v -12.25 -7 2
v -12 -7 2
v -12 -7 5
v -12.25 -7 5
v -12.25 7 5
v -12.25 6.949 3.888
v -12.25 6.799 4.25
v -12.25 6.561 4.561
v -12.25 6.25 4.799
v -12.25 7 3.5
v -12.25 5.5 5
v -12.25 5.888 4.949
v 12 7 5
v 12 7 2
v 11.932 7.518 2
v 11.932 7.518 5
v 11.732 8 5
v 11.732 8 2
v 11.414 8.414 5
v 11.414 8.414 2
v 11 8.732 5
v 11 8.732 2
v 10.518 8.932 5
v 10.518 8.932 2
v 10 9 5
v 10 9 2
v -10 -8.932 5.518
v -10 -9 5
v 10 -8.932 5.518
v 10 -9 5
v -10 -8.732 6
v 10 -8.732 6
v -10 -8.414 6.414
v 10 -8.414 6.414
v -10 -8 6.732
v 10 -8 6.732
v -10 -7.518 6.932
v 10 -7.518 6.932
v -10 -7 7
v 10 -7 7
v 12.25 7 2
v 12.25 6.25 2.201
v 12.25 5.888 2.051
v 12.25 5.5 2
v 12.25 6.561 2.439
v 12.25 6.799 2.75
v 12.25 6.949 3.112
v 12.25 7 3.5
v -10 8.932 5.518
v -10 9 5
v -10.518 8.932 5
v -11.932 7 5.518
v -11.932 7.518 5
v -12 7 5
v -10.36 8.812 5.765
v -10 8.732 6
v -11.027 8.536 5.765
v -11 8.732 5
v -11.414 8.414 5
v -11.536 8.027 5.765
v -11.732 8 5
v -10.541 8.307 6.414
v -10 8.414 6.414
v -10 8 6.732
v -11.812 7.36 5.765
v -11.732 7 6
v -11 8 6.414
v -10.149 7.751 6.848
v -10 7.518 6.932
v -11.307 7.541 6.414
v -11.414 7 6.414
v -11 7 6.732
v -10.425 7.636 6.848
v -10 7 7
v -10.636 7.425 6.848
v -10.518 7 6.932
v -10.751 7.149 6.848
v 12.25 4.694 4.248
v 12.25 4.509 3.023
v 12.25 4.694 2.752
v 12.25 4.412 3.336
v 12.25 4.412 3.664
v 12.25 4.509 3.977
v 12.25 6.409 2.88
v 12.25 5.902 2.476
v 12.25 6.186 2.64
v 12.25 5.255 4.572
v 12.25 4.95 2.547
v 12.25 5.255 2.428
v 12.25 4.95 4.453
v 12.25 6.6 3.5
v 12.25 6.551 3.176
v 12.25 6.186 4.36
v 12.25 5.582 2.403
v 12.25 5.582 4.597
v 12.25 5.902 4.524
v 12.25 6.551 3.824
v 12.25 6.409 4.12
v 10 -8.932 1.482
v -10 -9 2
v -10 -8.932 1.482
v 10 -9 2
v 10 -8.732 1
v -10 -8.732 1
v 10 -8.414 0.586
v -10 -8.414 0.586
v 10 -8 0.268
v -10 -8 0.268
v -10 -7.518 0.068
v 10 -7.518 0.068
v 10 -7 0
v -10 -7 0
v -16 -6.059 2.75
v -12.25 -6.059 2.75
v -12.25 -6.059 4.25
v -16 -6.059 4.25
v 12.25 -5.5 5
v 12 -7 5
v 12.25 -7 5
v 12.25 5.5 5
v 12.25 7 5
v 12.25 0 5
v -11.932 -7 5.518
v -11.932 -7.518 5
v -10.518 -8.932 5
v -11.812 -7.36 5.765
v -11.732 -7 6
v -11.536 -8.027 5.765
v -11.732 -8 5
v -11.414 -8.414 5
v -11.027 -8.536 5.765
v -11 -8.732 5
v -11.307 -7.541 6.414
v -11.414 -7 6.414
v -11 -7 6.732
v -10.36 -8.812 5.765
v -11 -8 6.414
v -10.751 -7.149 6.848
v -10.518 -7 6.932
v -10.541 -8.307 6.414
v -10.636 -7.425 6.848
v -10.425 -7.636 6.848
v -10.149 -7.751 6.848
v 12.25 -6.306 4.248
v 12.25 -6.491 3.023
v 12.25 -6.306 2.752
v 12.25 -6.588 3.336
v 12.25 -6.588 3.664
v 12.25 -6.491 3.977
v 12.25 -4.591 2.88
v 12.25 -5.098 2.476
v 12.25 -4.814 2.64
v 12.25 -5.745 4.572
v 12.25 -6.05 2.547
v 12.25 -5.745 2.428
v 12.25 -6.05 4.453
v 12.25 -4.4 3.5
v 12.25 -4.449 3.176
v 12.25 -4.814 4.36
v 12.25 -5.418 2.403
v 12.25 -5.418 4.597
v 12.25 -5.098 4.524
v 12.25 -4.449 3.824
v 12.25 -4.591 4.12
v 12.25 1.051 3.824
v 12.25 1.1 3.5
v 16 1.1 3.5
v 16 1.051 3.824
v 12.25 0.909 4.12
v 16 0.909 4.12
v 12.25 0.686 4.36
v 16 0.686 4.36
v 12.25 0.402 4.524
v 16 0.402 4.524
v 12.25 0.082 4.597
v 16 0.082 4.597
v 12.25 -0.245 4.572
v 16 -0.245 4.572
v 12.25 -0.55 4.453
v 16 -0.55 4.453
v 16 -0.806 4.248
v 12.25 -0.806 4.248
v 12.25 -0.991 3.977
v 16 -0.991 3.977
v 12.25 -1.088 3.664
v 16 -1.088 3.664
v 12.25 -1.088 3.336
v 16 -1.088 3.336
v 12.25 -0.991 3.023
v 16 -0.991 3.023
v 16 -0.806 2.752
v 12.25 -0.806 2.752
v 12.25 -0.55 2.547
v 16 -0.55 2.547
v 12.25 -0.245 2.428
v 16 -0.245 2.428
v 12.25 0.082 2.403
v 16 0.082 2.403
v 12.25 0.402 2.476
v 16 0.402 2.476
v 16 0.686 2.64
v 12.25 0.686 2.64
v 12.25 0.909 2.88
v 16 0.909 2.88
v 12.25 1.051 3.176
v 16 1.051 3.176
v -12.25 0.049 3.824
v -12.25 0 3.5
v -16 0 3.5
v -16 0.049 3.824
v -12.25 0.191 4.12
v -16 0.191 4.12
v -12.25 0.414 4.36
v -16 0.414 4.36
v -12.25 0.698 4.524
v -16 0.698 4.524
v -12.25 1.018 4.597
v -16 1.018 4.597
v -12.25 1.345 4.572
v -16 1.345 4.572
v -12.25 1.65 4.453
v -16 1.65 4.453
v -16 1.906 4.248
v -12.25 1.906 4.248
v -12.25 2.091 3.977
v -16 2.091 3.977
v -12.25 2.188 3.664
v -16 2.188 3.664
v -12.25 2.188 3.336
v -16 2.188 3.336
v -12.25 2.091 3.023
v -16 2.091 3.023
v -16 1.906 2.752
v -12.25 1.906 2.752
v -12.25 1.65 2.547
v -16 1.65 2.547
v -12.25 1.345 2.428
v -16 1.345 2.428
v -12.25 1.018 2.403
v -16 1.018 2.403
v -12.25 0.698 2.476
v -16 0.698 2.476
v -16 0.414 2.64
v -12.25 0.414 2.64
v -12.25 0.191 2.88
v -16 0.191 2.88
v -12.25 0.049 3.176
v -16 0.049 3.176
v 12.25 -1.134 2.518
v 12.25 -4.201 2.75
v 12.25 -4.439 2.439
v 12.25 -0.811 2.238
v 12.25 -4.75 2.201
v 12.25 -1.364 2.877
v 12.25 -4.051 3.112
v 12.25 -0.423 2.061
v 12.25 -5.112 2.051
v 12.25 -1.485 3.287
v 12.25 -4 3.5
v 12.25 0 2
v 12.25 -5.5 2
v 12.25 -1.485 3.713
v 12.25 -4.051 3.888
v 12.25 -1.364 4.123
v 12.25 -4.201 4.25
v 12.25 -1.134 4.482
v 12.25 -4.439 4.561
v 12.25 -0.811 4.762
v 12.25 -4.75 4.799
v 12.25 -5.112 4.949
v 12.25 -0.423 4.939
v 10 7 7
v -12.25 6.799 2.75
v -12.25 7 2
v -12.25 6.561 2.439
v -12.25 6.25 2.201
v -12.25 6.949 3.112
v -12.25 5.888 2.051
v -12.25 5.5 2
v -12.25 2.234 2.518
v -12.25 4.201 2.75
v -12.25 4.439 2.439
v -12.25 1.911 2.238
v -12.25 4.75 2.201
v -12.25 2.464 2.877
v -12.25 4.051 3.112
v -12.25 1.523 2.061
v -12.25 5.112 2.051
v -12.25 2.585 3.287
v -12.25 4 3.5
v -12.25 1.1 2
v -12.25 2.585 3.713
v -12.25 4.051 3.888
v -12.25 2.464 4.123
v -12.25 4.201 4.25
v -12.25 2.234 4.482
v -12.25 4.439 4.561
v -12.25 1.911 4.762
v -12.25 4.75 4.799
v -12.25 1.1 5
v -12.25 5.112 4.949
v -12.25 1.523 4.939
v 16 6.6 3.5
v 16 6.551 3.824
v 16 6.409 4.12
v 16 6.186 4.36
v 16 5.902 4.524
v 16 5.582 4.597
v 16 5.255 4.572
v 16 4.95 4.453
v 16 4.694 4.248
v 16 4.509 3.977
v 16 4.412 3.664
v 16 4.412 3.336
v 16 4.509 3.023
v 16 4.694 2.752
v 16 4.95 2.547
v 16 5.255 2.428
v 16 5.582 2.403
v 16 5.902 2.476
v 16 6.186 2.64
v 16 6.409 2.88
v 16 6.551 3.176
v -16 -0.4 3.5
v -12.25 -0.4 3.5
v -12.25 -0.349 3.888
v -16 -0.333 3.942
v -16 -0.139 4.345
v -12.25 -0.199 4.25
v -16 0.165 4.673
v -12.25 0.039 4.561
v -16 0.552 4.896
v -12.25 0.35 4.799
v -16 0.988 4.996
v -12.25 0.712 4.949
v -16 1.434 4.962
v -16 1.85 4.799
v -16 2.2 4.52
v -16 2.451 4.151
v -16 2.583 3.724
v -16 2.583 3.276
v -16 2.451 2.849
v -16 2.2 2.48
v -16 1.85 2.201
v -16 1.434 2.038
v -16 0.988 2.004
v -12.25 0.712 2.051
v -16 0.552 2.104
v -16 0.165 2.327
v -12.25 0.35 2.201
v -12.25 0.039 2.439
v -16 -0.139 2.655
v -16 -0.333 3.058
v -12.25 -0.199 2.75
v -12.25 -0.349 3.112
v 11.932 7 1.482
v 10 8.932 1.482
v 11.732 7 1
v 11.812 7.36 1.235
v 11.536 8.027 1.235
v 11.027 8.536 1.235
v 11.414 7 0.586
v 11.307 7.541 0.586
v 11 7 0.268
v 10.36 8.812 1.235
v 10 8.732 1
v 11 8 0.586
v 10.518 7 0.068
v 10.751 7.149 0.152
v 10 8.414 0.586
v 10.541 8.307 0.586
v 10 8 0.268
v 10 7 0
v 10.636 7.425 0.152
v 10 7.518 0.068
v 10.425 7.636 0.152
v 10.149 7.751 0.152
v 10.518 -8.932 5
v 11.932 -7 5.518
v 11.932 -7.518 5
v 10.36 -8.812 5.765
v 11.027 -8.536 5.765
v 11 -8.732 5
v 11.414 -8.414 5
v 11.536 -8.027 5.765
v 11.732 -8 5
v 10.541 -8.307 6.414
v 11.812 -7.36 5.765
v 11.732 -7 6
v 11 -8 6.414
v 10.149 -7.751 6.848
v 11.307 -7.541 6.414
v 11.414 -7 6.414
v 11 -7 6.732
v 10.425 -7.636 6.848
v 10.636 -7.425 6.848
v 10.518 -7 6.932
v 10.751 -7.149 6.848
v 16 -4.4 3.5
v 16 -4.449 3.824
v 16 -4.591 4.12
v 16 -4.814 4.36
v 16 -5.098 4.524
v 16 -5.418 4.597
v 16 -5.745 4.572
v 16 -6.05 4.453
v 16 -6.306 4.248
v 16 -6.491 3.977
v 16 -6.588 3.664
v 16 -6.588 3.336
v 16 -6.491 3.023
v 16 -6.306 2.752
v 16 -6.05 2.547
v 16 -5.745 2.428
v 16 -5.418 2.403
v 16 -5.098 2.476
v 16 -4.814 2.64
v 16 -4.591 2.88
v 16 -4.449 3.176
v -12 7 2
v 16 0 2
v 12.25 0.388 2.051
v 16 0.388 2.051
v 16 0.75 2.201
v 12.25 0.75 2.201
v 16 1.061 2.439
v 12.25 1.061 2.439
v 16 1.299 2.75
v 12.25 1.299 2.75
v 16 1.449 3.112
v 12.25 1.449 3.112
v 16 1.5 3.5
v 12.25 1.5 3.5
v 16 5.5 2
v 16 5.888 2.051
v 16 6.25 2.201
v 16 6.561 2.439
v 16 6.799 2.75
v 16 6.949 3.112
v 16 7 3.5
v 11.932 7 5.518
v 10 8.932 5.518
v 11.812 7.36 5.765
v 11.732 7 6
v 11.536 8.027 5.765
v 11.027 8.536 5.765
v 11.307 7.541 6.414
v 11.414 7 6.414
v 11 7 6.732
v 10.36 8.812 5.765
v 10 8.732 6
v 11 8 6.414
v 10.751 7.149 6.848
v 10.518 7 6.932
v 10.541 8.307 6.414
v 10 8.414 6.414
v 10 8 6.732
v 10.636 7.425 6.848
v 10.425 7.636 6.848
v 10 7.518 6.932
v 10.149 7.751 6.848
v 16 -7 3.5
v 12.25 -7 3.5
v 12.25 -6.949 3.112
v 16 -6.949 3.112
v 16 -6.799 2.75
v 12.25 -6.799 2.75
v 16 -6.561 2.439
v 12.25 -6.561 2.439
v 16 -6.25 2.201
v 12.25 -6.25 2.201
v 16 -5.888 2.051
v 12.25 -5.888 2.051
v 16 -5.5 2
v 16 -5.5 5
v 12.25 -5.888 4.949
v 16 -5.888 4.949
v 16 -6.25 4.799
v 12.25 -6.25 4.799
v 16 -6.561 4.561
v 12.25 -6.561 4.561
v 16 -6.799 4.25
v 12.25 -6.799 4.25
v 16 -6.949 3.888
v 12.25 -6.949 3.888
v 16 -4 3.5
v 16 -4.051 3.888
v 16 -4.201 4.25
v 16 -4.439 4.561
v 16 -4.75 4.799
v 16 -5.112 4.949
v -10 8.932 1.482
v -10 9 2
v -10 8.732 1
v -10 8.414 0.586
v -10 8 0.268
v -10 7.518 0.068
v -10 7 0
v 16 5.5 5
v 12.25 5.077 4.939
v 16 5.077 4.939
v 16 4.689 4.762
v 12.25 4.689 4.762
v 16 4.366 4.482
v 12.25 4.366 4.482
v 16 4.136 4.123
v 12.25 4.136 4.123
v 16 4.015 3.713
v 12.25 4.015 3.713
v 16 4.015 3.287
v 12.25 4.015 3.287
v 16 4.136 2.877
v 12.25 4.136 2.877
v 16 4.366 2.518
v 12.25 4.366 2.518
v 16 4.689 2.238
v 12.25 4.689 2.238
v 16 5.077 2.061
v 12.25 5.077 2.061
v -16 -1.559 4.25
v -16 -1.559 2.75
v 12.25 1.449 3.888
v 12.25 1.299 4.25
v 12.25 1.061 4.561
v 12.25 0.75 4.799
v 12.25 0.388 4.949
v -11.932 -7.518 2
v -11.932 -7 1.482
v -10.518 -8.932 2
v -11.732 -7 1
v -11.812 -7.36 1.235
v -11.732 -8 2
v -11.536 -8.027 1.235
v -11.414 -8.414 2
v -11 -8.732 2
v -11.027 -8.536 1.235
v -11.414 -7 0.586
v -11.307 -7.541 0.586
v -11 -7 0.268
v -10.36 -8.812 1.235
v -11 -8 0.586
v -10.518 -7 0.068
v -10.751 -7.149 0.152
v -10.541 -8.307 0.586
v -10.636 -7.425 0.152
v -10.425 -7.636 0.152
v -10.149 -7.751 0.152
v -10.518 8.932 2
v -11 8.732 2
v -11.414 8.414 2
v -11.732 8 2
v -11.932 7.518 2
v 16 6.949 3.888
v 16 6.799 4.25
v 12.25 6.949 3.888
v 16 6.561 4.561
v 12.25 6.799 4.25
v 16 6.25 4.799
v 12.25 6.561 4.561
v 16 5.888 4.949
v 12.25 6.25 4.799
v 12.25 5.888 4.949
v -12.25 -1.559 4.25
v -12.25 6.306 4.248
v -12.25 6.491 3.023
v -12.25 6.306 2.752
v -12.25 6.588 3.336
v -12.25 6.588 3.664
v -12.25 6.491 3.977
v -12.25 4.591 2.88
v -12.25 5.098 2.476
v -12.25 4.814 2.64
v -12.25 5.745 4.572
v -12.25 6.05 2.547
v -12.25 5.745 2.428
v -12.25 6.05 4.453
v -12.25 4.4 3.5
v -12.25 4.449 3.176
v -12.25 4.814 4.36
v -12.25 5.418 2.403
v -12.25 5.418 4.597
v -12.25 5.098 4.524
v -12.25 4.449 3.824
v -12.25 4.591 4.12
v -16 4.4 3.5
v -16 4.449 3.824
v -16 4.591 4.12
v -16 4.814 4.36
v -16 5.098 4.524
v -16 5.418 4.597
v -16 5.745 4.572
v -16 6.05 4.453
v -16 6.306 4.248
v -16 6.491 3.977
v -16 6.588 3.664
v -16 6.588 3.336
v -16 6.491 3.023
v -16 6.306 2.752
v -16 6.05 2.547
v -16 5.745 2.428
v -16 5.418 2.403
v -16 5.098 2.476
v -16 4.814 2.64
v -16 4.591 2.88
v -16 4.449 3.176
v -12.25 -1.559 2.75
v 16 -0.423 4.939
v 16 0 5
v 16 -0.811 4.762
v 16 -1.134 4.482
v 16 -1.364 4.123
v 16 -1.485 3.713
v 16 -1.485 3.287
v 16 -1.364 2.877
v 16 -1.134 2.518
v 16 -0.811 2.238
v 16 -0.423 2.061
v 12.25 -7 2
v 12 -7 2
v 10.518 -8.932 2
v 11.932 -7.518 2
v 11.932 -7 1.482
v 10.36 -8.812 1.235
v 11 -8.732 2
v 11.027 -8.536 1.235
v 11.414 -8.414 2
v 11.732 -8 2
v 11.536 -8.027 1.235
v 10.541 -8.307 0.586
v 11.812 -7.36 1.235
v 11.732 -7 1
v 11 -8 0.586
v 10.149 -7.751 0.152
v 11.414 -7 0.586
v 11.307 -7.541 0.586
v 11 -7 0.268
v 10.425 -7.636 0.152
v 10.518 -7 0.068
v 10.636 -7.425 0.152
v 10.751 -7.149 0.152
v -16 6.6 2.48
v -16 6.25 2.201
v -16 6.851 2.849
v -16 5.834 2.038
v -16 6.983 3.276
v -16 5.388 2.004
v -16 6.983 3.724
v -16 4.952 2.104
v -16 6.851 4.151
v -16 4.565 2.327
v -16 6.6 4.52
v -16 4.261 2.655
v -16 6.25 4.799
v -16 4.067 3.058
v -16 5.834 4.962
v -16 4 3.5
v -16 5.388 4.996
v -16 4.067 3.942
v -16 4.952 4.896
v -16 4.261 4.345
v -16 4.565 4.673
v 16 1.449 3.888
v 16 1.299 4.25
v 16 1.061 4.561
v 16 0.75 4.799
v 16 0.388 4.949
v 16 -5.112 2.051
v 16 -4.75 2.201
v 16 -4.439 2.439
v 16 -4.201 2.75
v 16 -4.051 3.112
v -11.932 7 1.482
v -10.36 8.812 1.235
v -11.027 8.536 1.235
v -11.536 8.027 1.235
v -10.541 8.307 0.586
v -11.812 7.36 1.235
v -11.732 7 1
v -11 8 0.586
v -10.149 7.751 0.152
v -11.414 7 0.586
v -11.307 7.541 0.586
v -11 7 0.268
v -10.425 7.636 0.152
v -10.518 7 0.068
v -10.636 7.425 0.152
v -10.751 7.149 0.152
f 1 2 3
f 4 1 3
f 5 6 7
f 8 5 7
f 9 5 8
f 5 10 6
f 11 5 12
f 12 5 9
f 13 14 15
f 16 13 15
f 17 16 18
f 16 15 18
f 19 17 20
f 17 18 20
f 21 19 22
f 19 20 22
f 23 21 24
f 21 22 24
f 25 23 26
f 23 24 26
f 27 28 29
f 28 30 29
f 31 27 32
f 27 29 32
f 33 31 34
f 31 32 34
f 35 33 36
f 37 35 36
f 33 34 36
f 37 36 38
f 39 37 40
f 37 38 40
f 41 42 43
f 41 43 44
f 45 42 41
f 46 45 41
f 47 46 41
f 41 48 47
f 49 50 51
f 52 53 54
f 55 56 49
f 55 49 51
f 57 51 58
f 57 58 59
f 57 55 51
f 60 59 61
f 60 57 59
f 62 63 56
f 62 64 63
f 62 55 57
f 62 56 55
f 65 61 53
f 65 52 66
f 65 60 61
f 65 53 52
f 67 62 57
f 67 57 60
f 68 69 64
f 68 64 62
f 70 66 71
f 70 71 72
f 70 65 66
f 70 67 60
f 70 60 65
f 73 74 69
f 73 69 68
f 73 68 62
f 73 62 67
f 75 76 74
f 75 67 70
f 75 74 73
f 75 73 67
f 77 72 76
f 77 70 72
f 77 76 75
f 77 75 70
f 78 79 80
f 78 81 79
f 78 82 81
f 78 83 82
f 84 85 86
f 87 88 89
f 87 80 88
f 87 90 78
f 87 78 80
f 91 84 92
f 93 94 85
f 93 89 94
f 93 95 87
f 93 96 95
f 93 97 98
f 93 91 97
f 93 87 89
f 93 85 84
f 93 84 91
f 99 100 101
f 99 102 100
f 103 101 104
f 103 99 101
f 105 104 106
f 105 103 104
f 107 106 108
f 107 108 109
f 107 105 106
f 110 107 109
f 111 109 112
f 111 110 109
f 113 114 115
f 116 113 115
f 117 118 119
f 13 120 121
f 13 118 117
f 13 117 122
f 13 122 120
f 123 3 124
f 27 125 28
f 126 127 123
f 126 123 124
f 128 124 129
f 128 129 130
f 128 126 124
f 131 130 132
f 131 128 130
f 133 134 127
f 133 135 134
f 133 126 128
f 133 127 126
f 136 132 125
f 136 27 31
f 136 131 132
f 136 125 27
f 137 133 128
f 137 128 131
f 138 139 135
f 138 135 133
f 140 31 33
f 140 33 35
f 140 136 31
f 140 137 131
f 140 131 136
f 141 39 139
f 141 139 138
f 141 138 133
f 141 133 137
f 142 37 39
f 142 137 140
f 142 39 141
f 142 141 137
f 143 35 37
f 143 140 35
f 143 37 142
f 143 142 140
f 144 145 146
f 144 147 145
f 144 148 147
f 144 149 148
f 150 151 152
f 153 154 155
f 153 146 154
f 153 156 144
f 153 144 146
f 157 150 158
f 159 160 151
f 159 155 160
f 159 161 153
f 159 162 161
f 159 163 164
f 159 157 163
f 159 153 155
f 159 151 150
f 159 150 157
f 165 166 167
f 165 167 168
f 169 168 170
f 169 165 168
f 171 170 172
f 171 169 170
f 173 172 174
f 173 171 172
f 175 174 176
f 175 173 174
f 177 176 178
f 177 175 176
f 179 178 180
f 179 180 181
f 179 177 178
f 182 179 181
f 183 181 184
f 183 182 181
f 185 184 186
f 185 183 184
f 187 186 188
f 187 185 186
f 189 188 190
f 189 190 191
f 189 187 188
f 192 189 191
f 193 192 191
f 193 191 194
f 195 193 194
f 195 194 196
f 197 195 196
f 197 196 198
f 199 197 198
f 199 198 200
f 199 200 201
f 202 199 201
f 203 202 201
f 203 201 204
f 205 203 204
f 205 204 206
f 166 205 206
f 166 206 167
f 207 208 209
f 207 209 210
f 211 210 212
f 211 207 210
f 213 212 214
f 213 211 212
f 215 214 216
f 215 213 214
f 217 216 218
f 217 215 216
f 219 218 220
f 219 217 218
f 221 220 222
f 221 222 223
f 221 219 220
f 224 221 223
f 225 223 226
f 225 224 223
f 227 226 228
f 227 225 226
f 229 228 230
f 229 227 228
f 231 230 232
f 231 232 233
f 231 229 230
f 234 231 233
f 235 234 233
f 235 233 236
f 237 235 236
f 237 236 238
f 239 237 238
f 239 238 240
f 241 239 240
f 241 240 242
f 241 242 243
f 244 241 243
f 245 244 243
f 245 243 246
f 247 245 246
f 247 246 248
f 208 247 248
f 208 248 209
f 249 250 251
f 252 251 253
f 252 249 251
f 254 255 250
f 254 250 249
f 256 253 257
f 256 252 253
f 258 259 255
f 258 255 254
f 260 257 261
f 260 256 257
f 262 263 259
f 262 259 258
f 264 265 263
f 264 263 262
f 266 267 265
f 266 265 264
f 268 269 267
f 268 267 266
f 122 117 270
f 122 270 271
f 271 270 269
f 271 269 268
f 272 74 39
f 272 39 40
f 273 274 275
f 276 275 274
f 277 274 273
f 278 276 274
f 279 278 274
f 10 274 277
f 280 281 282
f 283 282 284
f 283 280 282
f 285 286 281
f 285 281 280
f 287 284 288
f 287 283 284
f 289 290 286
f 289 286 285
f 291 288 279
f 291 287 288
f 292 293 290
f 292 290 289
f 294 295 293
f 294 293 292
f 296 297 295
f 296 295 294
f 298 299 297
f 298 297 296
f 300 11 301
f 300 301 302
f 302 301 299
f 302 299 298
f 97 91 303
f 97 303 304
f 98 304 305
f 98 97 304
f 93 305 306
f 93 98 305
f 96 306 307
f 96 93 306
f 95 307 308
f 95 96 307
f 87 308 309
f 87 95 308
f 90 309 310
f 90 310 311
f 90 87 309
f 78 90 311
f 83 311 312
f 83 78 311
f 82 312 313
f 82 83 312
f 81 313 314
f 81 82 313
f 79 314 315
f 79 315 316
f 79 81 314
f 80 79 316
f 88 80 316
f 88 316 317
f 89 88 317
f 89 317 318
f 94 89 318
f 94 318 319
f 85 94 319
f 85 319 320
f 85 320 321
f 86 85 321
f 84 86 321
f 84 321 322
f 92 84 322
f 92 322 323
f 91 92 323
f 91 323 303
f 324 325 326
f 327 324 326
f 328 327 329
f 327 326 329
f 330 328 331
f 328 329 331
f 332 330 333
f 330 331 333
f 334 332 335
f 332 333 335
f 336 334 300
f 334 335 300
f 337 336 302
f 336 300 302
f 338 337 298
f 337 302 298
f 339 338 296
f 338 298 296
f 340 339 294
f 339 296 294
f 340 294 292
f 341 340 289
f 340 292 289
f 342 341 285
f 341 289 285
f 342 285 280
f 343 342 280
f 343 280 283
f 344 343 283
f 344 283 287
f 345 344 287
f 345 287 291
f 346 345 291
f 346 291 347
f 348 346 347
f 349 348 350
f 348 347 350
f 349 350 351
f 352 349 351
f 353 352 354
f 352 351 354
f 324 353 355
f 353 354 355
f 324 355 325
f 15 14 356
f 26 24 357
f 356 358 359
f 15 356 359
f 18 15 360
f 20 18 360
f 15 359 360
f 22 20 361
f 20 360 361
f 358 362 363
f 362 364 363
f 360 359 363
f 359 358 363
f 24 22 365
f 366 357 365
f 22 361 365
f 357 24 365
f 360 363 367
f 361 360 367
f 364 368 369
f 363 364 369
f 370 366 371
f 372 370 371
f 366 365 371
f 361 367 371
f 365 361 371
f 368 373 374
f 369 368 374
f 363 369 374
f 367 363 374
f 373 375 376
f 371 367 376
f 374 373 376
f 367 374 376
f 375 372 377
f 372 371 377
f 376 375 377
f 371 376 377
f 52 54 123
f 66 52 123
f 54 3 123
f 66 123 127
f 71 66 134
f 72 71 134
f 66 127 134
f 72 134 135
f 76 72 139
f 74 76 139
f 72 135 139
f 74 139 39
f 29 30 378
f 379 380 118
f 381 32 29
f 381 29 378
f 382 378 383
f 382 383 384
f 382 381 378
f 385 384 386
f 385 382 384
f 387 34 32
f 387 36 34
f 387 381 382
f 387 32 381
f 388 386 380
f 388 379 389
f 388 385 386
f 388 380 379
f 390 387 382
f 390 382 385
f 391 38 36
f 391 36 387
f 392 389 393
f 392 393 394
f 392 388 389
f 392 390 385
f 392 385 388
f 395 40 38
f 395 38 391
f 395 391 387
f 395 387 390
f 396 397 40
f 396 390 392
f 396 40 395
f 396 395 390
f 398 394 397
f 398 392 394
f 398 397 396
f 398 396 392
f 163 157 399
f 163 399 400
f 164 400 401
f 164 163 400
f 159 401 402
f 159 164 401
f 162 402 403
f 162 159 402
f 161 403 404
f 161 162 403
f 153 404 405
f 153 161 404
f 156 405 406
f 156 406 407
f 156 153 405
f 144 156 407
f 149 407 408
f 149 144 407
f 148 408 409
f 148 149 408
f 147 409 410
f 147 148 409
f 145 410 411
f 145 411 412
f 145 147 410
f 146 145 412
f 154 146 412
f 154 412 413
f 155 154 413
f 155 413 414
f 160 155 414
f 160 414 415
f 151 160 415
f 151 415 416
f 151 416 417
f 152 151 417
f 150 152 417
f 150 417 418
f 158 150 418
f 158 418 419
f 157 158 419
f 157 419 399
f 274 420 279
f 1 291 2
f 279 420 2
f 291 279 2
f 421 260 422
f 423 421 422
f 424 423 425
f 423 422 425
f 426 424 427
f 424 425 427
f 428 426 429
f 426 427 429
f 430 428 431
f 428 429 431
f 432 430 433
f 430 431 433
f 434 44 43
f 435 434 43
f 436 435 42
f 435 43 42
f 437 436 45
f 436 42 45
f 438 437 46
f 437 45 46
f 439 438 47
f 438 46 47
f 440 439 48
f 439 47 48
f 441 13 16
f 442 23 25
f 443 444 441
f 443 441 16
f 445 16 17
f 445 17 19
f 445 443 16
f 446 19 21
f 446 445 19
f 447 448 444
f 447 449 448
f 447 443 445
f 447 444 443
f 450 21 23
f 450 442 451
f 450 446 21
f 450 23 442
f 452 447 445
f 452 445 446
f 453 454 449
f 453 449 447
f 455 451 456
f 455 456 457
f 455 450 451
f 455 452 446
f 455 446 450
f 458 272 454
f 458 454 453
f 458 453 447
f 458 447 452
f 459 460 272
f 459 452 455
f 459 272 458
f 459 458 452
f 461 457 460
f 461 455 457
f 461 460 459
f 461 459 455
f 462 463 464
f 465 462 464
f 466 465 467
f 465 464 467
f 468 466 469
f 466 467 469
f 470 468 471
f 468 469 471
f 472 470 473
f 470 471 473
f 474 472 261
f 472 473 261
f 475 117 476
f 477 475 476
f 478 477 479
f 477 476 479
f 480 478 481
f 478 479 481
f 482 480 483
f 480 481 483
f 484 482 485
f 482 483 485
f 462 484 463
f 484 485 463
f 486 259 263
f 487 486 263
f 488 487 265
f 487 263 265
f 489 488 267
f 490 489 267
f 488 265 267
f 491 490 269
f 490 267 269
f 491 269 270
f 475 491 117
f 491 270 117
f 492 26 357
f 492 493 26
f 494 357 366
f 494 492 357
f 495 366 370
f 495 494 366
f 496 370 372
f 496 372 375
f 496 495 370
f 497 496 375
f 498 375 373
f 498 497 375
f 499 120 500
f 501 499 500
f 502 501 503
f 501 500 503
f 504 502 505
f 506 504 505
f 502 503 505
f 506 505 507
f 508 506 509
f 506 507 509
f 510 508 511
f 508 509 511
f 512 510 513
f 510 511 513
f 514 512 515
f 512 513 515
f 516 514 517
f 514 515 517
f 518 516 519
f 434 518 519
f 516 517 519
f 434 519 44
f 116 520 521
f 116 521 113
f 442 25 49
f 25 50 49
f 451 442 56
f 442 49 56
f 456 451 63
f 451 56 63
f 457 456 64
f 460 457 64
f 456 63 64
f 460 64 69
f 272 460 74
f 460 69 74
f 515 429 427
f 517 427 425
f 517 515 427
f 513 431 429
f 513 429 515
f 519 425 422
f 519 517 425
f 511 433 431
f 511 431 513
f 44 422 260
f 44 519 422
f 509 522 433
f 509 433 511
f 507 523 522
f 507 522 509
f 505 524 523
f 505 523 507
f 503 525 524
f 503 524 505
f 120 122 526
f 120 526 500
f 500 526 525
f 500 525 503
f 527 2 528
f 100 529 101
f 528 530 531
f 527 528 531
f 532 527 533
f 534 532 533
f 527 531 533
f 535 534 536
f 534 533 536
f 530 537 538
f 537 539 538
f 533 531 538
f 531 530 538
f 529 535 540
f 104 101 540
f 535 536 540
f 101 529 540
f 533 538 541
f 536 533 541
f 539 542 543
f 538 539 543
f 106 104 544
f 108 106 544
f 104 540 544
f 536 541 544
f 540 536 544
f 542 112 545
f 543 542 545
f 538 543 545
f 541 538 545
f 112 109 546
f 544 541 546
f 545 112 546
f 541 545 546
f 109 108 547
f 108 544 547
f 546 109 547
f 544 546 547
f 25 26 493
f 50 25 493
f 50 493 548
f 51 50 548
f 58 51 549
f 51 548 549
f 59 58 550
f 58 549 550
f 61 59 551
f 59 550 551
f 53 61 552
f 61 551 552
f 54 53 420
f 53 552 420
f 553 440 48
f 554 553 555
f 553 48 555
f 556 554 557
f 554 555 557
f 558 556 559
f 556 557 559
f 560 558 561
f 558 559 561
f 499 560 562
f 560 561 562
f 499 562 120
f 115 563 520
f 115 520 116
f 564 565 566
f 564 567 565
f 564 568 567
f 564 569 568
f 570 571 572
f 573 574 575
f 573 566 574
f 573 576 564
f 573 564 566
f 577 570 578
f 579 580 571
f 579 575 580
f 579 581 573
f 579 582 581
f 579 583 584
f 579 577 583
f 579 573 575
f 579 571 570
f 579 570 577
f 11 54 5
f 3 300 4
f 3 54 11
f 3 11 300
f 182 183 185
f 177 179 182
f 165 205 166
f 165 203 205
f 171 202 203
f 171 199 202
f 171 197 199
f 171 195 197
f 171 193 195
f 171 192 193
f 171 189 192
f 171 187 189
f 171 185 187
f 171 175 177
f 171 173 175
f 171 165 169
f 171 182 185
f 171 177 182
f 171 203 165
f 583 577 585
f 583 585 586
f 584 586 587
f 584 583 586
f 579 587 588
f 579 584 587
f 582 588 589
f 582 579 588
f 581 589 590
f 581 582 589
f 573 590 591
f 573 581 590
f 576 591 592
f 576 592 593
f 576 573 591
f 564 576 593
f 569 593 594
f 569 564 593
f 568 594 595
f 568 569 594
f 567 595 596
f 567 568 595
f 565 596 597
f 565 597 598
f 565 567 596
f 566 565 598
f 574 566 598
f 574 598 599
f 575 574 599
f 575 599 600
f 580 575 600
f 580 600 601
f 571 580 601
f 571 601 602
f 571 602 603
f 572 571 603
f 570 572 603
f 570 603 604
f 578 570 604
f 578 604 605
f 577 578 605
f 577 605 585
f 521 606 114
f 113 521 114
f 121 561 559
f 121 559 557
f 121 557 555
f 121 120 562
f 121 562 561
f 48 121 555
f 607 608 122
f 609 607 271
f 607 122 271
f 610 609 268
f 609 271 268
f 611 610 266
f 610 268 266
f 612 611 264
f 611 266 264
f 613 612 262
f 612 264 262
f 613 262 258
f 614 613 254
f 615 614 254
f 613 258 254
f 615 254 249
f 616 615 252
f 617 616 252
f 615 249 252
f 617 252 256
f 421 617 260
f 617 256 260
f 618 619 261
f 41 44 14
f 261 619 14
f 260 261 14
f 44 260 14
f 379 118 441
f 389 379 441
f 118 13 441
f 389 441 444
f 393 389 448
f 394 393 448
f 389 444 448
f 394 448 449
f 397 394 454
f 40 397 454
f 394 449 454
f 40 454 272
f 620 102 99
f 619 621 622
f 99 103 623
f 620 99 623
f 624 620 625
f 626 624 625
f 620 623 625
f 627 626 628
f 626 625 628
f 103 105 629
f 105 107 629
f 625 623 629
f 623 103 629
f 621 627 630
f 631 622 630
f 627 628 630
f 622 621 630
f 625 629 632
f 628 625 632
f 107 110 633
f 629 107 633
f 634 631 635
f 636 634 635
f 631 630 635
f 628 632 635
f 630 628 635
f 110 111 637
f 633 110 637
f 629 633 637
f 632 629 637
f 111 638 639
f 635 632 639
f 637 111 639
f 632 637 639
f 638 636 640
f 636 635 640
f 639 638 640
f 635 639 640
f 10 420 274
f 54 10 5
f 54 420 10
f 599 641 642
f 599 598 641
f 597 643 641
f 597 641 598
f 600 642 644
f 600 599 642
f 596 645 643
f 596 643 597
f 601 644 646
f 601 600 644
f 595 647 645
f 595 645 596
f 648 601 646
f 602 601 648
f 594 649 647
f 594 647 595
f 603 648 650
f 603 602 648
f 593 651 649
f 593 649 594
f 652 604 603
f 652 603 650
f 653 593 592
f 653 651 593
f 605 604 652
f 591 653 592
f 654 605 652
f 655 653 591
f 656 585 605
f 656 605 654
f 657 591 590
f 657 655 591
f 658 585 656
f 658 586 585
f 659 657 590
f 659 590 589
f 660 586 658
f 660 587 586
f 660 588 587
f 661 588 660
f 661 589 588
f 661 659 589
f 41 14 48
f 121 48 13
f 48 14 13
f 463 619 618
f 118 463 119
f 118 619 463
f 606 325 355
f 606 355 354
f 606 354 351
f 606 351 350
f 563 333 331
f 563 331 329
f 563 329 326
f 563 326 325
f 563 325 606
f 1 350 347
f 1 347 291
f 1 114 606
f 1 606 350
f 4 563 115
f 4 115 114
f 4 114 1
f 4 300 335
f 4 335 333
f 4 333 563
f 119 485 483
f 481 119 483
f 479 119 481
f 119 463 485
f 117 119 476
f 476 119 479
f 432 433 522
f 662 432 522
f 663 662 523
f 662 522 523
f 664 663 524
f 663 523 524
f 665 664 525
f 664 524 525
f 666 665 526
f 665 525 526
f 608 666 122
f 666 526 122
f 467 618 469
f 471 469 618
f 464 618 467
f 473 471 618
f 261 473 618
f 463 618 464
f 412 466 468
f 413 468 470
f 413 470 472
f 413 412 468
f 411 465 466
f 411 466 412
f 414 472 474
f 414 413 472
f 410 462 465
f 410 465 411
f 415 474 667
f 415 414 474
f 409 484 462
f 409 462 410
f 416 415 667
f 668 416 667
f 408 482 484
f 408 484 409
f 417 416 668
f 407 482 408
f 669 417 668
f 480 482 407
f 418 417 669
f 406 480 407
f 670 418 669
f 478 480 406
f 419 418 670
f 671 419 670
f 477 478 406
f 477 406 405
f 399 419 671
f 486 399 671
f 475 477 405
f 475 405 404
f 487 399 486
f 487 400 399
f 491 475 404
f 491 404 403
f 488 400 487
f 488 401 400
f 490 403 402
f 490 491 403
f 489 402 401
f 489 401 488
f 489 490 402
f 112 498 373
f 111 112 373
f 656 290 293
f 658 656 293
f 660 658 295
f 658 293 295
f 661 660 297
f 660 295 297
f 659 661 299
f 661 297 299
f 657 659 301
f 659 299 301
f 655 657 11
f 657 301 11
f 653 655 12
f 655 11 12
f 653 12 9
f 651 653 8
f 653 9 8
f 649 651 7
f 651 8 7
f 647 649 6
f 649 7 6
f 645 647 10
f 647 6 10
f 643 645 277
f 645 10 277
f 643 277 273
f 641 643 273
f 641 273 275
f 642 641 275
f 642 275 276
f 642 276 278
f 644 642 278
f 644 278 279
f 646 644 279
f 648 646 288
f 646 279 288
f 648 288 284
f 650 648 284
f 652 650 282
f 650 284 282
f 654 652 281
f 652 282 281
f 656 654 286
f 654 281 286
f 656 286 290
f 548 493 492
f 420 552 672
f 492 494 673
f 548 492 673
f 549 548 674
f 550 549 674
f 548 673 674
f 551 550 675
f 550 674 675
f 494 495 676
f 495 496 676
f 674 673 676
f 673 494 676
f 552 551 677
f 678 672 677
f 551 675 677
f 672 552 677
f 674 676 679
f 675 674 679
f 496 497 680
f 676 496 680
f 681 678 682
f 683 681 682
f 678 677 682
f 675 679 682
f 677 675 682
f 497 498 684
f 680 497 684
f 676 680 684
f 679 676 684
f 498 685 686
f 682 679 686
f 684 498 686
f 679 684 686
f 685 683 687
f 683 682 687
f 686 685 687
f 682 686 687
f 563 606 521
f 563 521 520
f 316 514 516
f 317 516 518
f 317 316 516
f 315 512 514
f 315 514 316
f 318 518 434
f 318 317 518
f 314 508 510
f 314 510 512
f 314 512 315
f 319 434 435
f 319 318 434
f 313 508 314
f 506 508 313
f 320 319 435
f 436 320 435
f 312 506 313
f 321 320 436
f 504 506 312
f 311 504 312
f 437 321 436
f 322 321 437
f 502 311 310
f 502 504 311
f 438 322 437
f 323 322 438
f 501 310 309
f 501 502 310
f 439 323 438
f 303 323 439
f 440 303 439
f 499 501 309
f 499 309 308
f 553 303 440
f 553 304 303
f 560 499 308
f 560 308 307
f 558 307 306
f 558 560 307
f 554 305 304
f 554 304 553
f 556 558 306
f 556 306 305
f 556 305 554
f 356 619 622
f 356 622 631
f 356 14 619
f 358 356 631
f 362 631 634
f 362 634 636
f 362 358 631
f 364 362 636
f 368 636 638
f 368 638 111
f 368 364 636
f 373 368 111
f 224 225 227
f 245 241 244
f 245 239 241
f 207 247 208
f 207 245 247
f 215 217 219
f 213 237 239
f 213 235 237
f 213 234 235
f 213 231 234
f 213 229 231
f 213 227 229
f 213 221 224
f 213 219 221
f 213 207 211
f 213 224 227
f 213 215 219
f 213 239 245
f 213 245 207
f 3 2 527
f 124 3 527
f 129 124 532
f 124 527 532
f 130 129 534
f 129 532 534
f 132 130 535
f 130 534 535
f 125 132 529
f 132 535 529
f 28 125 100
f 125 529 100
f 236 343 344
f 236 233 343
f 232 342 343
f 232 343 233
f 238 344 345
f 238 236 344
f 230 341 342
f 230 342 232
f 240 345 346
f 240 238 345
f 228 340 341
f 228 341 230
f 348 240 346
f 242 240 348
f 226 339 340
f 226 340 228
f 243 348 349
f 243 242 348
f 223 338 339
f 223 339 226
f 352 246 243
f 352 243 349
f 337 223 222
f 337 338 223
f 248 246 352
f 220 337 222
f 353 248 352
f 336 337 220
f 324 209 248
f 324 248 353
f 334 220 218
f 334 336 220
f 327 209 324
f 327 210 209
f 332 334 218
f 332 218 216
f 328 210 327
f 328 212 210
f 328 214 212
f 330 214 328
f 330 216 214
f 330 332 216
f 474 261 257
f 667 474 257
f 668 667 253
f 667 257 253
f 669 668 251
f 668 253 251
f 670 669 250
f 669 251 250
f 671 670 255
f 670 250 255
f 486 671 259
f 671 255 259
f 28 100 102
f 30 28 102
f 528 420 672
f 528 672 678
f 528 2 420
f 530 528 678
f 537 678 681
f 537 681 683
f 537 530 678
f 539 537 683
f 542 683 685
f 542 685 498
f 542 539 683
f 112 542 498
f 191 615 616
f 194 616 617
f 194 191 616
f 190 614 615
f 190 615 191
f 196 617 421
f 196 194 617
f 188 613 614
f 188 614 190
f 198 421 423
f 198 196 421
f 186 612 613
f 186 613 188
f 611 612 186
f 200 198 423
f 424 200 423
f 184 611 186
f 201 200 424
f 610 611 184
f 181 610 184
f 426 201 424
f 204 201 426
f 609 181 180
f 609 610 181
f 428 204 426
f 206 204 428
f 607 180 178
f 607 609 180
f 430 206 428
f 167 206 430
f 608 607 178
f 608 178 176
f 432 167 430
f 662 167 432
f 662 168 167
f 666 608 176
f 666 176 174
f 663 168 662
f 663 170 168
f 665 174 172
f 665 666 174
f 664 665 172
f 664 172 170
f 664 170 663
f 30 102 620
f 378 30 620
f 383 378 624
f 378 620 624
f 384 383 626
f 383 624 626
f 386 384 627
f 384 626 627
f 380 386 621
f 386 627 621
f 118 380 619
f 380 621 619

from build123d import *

# Parameters (mm, degrees)
F1_DEPTH  = 7
F2_R      = 2
F3_R      = 1.1
F4_DEPTH  = 4
F5_R      = 1.5
F5_R_2    = 1.1
F6_DEPTH  = 4
F5_W      = 4.5
F5_H      = 1.5
F7_W      = 14
F7_H      = 3
F8_DEPTH  = 0.25
F9_W      = 14
F9_H      = 3
F10_DEPTH = 0.25


with BuildPart() as f1:
    # F0 (on Top) → F1 (new body)
    with BuildSketch(Plane.XY):
        with BuildLine():
            ThreePointArc((12, 7), (11.4142135624, 8.4142135624), (10, 9))
            Line((10, 9), (-10, 9))
            ThreePointArc((-10, 9), (-11.4142135624, 8.4142135624), (-12, 7))
            Line((-12, 7), (-12, -7))
            ThreePointArc((-12, -7), (-11.4142135624, -8.4142135624), (-10, -9))
            Line((-10, -9), (10, -9))
            ThreePointArc((10, -9), (11.4142135624, -8.4142135624), (12, -7))
            Line((12, -7), (12, 7))
        make_face()
    extrude(amount=F1_DEPTH)

    # F2
    f2_edges = [f1.edges().sort_by_distance(p)[0] for p in [
        (11.414214, 8.414214, 7),
        (0, 9, 7),
        (-11.414214, 8.414214, 7),
        (-12, 0, 7),
        (-11.414214, -8.414214, 7),
        (0, -9, 7),
        (11.414214, -8.414214, 7),
        (12, 0, 7),
        (11.414214, 8.414214, 0),
        (0, 9, 0),
        (-11.414214, 8.414214, 0),
        (-12, 0, 0),
        (-11.414214, -8.414214, 0),
        (0, -9, 0),
        (11.414214, -8.414214, 0),
        (12, 0, 0),
    ]]
    fillet(f2_edges, radius=F2_R)



with BuildPart() as f4:
    # F3 (on face) → F4 (new body)
    with BuildSketch(Plane.YZ.offset(12)):
        with BuildLine():
            ThreePointArc((-4, 3.5), (-4.4393398246, 4.5606601681), (-5.4999999897, 5))
            ThreePointArc((-5.4999999897, 5), (-6.5606601681, 4.5606601754), (-7, 3.5))
            ThreePointArc((-7, 3.5), (-6.5606601718, 2.4393398282), (-5.5, 2))
            ThreePointArc((-5.5, 2), (-4.4393398282, 2.4393398282), (-4, 3.5))
        make_face()
        with Locations((-5.5, 3.5)):
            Circle(F3_R, mode=Mode.SUBTRACT)
    extrude(amount=F4_DEPTH)


with BuildPart() as f4b:
    # F3 (on face) → F4, piece 2 (new body)
    with BuildSketch(Plane.YZ.offset(12)):
        with BuildLine():
            ThreePointArc((0, 2), (1.0606601718, 2.4393398282), (1.5, 3.5))
            ThreePointArc((1.5, 3.5), (1.0606601718, 4.5606601718), (0, 5))
            ThreePointArc((0, 5), (-1.5, 3.5), (0, 2))
        make_face()
        with Locations((0, 3.5)):
            Circle(F3_R, mode=Mode.SUBTRACT)
    extrude(amount=F4_DEPTH)


with BuildPart() as f4c:
    # F3 (on face) → F4, piece 3 (new body)
    with BuildSketch(Plane.YZ.offset(12)):
        with BuildLine():
            ThreePointArc((7, 3.5), (6.5606601718, 4.5606601718), (5.5, 5))
            ThreePointArc((5.5, 5), (4, 3.499999998), (5.5000000039, 2))
            ThreePointArc((5.5000000039, 2), (6.5606601732, 2.4393398296), (7, 3.5))
        make_face()
        with Locations((5.5, 3.5)):
            Circle(F3_R, mode=Mode.SUBTRACT)
    extrude(amount=F4_DEPTH)


with BuildPart() as f6:
    # F5 (on face) → F6 (new body)
    with BuildSketch(Plane(origin=(-12, 0, 0), x_dir=(0, -1, 0), z_dir=(-1, 0, 0))):
        with Locations((-5.5, 3.5)):
            Circle(F5_R)
        with Locations((-5.5, 3.5)):
            Circle(F5_R_2, mode=Mode.SUBTRACT)
    extrude(amount=F6_DEPTH)


with BuildPart() as f6b:
    # F5 (on face) → F6, piece 2 (new body)
    with BuildSketch(Plane(origin=(-12, 0, 0), x_dir=(0, -1, 0), z_dir=(-1, 0, 0))):
        with Locations((-1.1, 3.5)):
            Circle(F5_R)
        with Locations((-1.1, 3.5)):
            Circle(F5_R_2, mode=Mode.SUBTRACT)
    extrude(amount=F6_DEPTH)


with BuildPart() as f6c:
    # F5 (on face) → F6, piece 3 (new body)
    with BuildSketch(Plane(origin=(-12, 0, 0), x_dir=(0, -1, 0), z_dir=(-1, 0, 0))):
        with Locations((3.8085386623, 3.5)):
            Rectangle(F5_W, F5_H)
    extrude(amount=F6_DEPTH)


with BuildPart() as f1_1:
    add(f1.part)

    add(f4.part)  # F8 merges F4

    add(f4b.part)  # F8 merges F4b

    add(f4c.part)  # F8 merges F4c
    # F7 (on face) → F8 (join)
    with BuildSketch(Plane.YZ.offset(12)):
        with Locations((0, 3.5)):
            Rectangle(F7_W, F7_H)
    extrude(amount=F8_DEPTH)


    add(f6.part)  # F10 merges F6

    add(f6b.part)  # F10 merges F6b

    add(f6c.part)  # F10 merges F6c
    # F9 (on face) → F10 (join)
    with BuildSketch(Plane(origin=(-12, 0, 0), x_dir=(0, -1, 0), z_dir=(-1, 0, 0))):
        with Locations((0, 3.5)):
            Rectangle(F9_W, F9_H)
    extrude(amount=F10_DEPTH)


solid = f1_1.part
